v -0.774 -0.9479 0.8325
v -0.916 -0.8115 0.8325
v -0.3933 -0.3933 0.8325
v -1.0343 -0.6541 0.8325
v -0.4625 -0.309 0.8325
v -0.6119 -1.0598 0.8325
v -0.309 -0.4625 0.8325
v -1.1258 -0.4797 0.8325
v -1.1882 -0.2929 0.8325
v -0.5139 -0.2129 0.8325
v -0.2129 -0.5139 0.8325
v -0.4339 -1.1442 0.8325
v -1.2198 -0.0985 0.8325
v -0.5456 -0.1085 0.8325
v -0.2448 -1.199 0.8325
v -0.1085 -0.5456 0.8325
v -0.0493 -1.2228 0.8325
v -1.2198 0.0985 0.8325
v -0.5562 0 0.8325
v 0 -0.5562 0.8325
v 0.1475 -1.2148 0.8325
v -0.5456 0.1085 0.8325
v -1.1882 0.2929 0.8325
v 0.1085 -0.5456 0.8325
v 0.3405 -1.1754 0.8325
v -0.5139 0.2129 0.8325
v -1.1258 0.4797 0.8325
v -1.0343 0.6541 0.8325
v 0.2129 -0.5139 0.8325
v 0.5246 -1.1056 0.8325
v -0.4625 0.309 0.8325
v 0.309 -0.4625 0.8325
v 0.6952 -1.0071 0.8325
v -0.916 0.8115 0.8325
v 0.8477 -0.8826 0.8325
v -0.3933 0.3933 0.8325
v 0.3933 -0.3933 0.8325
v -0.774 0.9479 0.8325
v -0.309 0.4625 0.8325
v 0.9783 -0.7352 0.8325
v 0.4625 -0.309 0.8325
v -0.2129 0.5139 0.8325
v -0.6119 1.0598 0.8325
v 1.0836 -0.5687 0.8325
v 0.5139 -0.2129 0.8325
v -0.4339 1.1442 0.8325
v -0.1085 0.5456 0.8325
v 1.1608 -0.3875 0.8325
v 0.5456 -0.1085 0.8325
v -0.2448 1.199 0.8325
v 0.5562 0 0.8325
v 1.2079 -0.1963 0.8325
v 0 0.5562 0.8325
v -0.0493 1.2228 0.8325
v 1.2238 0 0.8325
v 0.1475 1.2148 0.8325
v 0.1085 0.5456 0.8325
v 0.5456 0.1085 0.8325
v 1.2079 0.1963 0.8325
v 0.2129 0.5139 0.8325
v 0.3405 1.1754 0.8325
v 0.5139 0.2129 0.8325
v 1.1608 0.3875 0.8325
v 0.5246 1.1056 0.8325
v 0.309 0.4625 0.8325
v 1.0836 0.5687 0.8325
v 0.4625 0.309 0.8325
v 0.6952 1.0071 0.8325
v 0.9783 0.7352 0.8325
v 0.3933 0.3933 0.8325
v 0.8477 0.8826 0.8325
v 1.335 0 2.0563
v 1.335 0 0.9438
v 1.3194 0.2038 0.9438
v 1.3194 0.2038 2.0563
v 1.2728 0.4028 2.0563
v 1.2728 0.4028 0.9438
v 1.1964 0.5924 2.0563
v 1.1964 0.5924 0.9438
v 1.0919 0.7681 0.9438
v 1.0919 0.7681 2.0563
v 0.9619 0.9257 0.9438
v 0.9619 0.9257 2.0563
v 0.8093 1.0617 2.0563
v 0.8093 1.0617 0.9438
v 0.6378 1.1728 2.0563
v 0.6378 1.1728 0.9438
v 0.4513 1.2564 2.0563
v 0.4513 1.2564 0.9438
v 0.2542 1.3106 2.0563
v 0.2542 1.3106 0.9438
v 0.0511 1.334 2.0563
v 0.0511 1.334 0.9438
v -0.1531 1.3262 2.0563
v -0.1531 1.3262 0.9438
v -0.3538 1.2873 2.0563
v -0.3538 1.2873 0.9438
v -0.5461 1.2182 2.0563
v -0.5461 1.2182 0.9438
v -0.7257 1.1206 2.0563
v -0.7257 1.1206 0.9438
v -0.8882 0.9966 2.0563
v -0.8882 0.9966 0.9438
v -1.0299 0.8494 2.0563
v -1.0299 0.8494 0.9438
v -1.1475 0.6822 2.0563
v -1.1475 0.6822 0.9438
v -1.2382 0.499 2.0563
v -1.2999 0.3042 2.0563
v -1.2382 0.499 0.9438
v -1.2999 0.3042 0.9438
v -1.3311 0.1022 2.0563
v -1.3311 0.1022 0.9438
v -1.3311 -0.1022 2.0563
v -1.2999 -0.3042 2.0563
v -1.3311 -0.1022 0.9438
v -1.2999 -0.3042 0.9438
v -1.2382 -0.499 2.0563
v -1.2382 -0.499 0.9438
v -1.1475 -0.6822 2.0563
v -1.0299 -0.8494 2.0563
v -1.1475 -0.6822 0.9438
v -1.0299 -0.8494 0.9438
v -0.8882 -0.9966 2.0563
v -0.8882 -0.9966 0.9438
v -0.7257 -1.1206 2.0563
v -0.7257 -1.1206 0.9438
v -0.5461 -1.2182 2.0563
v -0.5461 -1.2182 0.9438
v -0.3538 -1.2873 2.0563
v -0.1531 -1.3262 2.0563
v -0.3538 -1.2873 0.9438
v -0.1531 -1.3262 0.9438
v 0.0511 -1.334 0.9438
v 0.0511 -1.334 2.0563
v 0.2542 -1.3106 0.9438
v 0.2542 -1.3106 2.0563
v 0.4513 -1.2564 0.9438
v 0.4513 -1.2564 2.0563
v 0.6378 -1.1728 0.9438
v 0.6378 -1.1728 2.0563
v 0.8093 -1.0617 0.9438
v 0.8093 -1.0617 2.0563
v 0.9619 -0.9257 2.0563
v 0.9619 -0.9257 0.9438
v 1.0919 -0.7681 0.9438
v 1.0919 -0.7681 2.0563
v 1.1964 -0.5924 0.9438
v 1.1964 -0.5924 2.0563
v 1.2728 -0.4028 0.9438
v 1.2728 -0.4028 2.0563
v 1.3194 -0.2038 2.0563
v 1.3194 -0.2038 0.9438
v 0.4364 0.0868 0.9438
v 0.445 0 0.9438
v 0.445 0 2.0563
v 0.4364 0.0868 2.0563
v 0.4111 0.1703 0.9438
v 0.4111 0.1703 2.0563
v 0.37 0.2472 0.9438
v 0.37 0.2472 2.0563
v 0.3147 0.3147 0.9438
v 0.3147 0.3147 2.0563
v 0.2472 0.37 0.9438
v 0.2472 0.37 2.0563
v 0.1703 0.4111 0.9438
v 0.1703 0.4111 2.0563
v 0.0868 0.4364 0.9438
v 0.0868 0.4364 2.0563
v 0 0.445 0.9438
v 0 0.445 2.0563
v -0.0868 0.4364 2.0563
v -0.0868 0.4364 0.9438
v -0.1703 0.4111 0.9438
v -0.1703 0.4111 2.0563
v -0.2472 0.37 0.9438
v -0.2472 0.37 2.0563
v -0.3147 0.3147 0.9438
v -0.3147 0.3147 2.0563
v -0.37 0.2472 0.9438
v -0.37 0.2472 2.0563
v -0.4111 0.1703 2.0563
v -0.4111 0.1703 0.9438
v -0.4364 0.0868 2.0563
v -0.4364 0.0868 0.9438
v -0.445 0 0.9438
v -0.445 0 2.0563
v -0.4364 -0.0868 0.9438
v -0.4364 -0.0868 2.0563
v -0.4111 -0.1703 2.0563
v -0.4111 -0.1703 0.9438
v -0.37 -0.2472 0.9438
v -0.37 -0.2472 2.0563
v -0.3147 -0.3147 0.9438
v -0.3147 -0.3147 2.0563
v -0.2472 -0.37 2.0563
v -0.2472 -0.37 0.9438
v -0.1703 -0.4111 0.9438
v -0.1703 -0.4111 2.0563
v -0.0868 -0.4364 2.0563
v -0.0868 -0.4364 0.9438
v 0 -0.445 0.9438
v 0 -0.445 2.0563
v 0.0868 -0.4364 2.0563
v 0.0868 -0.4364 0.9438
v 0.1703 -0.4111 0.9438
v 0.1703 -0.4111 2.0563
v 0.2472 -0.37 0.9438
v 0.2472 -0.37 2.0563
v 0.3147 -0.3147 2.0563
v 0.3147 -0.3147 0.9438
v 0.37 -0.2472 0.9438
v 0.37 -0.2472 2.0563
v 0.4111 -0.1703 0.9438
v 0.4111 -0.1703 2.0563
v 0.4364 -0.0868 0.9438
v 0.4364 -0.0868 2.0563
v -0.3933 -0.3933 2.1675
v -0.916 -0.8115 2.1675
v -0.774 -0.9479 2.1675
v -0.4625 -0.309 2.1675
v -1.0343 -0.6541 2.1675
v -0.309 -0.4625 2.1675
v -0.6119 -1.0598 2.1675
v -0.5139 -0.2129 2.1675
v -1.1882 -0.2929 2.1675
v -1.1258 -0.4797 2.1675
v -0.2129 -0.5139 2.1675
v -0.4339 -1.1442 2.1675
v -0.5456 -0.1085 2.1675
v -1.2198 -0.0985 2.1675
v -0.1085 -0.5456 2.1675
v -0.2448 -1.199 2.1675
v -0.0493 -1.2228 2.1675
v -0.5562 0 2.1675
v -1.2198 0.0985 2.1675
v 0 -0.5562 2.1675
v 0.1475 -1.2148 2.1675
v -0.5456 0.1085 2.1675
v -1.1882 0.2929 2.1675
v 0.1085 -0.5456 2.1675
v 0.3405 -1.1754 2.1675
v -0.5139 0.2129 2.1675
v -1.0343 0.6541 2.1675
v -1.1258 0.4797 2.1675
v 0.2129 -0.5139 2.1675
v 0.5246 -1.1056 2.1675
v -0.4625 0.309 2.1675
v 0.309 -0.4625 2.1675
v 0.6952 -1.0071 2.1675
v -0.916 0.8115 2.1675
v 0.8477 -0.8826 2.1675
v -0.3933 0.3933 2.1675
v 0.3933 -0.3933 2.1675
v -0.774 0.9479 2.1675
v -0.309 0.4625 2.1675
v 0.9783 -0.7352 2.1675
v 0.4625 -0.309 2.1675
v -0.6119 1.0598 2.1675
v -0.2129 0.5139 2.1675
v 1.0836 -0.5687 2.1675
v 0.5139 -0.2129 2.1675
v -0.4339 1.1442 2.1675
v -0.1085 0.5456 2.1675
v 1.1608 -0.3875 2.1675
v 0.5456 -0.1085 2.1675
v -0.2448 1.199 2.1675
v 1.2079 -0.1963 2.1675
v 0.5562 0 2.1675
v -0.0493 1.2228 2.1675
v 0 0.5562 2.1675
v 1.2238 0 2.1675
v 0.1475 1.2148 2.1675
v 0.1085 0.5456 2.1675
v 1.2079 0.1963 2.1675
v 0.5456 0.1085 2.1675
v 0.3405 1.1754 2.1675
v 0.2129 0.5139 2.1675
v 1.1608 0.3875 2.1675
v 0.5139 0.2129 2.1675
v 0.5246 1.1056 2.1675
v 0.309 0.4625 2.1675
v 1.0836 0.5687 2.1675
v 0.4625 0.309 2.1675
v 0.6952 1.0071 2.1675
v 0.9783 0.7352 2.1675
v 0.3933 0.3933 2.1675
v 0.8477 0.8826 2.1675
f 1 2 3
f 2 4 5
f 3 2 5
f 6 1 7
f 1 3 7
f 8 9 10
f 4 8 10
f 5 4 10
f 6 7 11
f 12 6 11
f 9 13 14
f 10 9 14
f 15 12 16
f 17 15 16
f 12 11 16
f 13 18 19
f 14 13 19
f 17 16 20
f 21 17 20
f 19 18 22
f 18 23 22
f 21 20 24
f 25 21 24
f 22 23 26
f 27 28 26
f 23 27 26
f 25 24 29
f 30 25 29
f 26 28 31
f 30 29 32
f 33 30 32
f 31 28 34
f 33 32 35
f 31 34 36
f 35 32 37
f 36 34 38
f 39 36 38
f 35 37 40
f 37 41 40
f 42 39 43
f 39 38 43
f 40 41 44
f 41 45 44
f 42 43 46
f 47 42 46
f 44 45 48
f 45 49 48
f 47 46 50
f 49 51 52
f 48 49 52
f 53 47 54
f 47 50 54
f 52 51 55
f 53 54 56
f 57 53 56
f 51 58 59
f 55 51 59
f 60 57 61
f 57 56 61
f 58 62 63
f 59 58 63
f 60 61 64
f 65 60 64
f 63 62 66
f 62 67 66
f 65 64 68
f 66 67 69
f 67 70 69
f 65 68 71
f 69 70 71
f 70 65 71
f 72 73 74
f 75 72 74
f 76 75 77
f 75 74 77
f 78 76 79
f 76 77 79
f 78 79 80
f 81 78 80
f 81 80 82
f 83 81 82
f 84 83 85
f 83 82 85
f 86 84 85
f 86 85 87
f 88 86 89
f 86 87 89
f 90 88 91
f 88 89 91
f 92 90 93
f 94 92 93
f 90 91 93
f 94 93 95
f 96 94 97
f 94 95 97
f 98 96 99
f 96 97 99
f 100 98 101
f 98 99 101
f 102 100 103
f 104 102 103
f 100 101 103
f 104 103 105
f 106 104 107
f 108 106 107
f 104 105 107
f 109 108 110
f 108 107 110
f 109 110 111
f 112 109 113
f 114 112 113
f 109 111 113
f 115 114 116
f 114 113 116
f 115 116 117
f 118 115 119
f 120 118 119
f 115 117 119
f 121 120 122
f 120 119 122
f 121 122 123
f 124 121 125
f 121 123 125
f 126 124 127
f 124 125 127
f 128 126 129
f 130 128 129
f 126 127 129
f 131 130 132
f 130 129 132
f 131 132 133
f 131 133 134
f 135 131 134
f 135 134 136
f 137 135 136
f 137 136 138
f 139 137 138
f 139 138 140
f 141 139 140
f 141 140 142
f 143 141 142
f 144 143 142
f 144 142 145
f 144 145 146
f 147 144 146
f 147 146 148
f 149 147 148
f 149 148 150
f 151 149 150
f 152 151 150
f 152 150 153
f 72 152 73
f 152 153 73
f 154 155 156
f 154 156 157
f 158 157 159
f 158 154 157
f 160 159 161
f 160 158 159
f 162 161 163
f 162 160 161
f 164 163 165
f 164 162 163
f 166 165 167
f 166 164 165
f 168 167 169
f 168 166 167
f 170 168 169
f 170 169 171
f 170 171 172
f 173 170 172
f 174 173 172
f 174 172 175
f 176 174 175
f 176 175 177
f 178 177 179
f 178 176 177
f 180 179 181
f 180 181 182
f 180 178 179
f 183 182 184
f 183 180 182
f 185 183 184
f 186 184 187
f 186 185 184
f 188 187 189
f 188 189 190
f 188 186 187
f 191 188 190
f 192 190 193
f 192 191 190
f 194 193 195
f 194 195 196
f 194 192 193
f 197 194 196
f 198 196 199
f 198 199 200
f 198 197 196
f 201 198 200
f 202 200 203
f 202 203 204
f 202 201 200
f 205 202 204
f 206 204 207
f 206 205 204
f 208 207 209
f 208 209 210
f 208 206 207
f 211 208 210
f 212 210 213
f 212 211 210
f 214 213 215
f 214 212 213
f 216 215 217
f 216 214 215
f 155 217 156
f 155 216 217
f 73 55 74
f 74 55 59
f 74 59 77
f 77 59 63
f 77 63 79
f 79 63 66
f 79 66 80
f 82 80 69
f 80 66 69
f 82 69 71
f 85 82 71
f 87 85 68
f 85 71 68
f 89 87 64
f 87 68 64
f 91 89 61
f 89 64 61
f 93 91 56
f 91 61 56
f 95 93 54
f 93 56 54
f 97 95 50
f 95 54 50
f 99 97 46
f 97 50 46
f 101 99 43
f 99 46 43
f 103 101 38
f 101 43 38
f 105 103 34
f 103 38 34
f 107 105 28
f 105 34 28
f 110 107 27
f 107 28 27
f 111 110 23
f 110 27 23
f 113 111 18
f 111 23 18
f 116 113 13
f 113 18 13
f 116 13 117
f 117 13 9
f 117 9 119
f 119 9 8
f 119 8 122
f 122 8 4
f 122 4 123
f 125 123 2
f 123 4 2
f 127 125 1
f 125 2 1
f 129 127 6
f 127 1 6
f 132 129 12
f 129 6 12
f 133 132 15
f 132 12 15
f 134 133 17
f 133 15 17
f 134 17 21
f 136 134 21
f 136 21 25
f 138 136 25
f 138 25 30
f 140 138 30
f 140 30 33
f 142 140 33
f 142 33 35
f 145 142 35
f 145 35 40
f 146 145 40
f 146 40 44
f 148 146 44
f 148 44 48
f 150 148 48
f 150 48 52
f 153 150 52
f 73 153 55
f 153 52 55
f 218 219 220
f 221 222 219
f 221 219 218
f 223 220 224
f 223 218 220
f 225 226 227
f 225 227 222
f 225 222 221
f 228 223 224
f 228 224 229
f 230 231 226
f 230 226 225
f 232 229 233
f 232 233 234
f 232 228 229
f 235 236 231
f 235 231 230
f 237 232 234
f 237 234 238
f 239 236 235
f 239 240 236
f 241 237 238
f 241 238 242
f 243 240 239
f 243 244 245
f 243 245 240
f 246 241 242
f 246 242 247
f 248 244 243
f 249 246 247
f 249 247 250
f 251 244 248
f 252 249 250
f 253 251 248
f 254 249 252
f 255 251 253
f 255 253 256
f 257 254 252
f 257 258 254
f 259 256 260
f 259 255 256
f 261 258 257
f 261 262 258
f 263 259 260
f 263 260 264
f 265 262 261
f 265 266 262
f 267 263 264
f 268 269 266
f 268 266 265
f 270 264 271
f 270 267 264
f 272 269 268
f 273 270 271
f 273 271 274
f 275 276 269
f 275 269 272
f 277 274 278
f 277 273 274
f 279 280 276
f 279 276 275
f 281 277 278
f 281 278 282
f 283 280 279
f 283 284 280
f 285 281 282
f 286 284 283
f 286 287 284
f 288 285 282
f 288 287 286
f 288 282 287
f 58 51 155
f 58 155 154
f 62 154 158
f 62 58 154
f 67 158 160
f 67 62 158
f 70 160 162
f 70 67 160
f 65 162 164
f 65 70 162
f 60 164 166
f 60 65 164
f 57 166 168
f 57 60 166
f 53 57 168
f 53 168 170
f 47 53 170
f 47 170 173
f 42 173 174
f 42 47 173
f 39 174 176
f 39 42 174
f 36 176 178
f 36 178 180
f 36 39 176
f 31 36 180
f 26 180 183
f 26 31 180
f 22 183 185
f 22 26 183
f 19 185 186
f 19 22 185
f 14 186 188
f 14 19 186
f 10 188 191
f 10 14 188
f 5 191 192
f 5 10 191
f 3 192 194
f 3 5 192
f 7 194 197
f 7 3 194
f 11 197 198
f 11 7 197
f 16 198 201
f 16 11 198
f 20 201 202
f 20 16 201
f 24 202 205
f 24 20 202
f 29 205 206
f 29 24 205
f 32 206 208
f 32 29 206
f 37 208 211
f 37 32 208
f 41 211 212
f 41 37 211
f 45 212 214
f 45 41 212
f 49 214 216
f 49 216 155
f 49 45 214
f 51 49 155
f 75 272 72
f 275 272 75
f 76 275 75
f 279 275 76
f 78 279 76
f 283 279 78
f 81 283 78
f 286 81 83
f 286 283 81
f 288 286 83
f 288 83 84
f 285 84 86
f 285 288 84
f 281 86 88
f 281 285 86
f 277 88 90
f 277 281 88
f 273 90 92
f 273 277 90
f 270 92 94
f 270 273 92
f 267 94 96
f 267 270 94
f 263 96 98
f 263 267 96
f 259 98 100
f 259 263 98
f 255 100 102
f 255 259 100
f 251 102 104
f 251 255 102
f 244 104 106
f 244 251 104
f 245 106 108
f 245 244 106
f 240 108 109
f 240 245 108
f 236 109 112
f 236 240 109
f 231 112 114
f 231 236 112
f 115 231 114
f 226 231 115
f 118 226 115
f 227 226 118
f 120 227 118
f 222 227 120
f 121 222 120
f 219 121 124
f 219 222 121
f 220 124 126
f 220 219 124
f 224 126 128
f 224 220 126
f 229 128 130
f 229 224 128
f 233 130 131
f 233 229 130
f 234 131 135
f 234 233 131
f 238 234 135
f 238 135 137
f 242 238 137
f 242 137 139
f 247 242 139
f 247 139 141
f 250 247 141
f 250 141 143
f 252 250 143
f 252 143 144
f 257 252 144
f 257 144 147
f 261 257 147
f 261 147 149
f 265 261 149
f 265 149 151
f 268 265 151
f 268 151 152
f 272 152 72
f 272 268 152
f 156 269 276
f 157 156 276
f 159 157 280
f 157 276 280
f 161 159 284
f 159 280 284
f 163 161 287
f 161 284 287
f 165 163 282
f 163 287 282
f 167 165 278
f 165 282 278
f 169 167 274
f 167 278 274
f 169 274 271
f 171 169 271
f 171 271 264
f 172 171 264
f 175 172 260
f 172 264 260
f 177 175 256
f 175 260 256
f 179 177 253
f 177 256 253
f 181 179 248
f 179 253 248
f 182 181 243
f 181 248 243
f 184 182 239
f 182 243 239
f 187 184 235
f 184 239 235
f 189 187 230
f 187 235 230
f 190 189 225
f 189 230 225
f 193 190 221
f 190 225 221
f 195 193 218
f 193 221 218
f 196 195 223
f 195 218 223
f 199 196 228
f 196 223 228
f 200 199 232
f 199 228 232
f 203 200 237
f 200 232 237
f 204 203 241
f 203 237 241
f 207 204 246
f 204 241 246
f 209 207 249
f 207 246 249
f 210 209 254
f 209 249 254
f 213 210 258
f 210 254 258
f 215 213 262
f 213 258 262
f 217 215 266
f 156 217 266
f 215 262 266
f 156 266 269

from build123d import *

# Parameters (mm, degrees)
SKETCH1_R           = 3
SKETCH1_R_2         = 1
EXTRUDE_THIN1_DEPTH = 3
CHAMFER1_SIZE       = 0.25
SCALE1_SCALE        = 0.445


with BuildPart() as part:
    # Sketch1 → Extrude-Thin1 (new body)
    with BuildSketch(Plane.XY):
        Circle(SKETCH1_R)
        Circle(SKETCH1_R_2, mode=Mode.SUBTRACT)
    extrude(amount=EXTRUDE_THIN1_DEPTH)

    # Chamfer1
    chamfer1_edges = [part.edges().sort_by_distance(p)[0] for p in [
        (-3, 0, 0),
        (-3, 0, 3),
        (-1, 0, 0),
        (-1, 0, 3),
    ]]
    chamfer(chamfer1_edges, length=CHAMFER1_SIZE)


with BuildPart() as part_1:
    # Scale1: scaled about (0, 0, 1.5)
    add(part.part.scale(SCALE1_SCALE).moved(Location((0, 0, 0.8325))))


solid = part_1.part
